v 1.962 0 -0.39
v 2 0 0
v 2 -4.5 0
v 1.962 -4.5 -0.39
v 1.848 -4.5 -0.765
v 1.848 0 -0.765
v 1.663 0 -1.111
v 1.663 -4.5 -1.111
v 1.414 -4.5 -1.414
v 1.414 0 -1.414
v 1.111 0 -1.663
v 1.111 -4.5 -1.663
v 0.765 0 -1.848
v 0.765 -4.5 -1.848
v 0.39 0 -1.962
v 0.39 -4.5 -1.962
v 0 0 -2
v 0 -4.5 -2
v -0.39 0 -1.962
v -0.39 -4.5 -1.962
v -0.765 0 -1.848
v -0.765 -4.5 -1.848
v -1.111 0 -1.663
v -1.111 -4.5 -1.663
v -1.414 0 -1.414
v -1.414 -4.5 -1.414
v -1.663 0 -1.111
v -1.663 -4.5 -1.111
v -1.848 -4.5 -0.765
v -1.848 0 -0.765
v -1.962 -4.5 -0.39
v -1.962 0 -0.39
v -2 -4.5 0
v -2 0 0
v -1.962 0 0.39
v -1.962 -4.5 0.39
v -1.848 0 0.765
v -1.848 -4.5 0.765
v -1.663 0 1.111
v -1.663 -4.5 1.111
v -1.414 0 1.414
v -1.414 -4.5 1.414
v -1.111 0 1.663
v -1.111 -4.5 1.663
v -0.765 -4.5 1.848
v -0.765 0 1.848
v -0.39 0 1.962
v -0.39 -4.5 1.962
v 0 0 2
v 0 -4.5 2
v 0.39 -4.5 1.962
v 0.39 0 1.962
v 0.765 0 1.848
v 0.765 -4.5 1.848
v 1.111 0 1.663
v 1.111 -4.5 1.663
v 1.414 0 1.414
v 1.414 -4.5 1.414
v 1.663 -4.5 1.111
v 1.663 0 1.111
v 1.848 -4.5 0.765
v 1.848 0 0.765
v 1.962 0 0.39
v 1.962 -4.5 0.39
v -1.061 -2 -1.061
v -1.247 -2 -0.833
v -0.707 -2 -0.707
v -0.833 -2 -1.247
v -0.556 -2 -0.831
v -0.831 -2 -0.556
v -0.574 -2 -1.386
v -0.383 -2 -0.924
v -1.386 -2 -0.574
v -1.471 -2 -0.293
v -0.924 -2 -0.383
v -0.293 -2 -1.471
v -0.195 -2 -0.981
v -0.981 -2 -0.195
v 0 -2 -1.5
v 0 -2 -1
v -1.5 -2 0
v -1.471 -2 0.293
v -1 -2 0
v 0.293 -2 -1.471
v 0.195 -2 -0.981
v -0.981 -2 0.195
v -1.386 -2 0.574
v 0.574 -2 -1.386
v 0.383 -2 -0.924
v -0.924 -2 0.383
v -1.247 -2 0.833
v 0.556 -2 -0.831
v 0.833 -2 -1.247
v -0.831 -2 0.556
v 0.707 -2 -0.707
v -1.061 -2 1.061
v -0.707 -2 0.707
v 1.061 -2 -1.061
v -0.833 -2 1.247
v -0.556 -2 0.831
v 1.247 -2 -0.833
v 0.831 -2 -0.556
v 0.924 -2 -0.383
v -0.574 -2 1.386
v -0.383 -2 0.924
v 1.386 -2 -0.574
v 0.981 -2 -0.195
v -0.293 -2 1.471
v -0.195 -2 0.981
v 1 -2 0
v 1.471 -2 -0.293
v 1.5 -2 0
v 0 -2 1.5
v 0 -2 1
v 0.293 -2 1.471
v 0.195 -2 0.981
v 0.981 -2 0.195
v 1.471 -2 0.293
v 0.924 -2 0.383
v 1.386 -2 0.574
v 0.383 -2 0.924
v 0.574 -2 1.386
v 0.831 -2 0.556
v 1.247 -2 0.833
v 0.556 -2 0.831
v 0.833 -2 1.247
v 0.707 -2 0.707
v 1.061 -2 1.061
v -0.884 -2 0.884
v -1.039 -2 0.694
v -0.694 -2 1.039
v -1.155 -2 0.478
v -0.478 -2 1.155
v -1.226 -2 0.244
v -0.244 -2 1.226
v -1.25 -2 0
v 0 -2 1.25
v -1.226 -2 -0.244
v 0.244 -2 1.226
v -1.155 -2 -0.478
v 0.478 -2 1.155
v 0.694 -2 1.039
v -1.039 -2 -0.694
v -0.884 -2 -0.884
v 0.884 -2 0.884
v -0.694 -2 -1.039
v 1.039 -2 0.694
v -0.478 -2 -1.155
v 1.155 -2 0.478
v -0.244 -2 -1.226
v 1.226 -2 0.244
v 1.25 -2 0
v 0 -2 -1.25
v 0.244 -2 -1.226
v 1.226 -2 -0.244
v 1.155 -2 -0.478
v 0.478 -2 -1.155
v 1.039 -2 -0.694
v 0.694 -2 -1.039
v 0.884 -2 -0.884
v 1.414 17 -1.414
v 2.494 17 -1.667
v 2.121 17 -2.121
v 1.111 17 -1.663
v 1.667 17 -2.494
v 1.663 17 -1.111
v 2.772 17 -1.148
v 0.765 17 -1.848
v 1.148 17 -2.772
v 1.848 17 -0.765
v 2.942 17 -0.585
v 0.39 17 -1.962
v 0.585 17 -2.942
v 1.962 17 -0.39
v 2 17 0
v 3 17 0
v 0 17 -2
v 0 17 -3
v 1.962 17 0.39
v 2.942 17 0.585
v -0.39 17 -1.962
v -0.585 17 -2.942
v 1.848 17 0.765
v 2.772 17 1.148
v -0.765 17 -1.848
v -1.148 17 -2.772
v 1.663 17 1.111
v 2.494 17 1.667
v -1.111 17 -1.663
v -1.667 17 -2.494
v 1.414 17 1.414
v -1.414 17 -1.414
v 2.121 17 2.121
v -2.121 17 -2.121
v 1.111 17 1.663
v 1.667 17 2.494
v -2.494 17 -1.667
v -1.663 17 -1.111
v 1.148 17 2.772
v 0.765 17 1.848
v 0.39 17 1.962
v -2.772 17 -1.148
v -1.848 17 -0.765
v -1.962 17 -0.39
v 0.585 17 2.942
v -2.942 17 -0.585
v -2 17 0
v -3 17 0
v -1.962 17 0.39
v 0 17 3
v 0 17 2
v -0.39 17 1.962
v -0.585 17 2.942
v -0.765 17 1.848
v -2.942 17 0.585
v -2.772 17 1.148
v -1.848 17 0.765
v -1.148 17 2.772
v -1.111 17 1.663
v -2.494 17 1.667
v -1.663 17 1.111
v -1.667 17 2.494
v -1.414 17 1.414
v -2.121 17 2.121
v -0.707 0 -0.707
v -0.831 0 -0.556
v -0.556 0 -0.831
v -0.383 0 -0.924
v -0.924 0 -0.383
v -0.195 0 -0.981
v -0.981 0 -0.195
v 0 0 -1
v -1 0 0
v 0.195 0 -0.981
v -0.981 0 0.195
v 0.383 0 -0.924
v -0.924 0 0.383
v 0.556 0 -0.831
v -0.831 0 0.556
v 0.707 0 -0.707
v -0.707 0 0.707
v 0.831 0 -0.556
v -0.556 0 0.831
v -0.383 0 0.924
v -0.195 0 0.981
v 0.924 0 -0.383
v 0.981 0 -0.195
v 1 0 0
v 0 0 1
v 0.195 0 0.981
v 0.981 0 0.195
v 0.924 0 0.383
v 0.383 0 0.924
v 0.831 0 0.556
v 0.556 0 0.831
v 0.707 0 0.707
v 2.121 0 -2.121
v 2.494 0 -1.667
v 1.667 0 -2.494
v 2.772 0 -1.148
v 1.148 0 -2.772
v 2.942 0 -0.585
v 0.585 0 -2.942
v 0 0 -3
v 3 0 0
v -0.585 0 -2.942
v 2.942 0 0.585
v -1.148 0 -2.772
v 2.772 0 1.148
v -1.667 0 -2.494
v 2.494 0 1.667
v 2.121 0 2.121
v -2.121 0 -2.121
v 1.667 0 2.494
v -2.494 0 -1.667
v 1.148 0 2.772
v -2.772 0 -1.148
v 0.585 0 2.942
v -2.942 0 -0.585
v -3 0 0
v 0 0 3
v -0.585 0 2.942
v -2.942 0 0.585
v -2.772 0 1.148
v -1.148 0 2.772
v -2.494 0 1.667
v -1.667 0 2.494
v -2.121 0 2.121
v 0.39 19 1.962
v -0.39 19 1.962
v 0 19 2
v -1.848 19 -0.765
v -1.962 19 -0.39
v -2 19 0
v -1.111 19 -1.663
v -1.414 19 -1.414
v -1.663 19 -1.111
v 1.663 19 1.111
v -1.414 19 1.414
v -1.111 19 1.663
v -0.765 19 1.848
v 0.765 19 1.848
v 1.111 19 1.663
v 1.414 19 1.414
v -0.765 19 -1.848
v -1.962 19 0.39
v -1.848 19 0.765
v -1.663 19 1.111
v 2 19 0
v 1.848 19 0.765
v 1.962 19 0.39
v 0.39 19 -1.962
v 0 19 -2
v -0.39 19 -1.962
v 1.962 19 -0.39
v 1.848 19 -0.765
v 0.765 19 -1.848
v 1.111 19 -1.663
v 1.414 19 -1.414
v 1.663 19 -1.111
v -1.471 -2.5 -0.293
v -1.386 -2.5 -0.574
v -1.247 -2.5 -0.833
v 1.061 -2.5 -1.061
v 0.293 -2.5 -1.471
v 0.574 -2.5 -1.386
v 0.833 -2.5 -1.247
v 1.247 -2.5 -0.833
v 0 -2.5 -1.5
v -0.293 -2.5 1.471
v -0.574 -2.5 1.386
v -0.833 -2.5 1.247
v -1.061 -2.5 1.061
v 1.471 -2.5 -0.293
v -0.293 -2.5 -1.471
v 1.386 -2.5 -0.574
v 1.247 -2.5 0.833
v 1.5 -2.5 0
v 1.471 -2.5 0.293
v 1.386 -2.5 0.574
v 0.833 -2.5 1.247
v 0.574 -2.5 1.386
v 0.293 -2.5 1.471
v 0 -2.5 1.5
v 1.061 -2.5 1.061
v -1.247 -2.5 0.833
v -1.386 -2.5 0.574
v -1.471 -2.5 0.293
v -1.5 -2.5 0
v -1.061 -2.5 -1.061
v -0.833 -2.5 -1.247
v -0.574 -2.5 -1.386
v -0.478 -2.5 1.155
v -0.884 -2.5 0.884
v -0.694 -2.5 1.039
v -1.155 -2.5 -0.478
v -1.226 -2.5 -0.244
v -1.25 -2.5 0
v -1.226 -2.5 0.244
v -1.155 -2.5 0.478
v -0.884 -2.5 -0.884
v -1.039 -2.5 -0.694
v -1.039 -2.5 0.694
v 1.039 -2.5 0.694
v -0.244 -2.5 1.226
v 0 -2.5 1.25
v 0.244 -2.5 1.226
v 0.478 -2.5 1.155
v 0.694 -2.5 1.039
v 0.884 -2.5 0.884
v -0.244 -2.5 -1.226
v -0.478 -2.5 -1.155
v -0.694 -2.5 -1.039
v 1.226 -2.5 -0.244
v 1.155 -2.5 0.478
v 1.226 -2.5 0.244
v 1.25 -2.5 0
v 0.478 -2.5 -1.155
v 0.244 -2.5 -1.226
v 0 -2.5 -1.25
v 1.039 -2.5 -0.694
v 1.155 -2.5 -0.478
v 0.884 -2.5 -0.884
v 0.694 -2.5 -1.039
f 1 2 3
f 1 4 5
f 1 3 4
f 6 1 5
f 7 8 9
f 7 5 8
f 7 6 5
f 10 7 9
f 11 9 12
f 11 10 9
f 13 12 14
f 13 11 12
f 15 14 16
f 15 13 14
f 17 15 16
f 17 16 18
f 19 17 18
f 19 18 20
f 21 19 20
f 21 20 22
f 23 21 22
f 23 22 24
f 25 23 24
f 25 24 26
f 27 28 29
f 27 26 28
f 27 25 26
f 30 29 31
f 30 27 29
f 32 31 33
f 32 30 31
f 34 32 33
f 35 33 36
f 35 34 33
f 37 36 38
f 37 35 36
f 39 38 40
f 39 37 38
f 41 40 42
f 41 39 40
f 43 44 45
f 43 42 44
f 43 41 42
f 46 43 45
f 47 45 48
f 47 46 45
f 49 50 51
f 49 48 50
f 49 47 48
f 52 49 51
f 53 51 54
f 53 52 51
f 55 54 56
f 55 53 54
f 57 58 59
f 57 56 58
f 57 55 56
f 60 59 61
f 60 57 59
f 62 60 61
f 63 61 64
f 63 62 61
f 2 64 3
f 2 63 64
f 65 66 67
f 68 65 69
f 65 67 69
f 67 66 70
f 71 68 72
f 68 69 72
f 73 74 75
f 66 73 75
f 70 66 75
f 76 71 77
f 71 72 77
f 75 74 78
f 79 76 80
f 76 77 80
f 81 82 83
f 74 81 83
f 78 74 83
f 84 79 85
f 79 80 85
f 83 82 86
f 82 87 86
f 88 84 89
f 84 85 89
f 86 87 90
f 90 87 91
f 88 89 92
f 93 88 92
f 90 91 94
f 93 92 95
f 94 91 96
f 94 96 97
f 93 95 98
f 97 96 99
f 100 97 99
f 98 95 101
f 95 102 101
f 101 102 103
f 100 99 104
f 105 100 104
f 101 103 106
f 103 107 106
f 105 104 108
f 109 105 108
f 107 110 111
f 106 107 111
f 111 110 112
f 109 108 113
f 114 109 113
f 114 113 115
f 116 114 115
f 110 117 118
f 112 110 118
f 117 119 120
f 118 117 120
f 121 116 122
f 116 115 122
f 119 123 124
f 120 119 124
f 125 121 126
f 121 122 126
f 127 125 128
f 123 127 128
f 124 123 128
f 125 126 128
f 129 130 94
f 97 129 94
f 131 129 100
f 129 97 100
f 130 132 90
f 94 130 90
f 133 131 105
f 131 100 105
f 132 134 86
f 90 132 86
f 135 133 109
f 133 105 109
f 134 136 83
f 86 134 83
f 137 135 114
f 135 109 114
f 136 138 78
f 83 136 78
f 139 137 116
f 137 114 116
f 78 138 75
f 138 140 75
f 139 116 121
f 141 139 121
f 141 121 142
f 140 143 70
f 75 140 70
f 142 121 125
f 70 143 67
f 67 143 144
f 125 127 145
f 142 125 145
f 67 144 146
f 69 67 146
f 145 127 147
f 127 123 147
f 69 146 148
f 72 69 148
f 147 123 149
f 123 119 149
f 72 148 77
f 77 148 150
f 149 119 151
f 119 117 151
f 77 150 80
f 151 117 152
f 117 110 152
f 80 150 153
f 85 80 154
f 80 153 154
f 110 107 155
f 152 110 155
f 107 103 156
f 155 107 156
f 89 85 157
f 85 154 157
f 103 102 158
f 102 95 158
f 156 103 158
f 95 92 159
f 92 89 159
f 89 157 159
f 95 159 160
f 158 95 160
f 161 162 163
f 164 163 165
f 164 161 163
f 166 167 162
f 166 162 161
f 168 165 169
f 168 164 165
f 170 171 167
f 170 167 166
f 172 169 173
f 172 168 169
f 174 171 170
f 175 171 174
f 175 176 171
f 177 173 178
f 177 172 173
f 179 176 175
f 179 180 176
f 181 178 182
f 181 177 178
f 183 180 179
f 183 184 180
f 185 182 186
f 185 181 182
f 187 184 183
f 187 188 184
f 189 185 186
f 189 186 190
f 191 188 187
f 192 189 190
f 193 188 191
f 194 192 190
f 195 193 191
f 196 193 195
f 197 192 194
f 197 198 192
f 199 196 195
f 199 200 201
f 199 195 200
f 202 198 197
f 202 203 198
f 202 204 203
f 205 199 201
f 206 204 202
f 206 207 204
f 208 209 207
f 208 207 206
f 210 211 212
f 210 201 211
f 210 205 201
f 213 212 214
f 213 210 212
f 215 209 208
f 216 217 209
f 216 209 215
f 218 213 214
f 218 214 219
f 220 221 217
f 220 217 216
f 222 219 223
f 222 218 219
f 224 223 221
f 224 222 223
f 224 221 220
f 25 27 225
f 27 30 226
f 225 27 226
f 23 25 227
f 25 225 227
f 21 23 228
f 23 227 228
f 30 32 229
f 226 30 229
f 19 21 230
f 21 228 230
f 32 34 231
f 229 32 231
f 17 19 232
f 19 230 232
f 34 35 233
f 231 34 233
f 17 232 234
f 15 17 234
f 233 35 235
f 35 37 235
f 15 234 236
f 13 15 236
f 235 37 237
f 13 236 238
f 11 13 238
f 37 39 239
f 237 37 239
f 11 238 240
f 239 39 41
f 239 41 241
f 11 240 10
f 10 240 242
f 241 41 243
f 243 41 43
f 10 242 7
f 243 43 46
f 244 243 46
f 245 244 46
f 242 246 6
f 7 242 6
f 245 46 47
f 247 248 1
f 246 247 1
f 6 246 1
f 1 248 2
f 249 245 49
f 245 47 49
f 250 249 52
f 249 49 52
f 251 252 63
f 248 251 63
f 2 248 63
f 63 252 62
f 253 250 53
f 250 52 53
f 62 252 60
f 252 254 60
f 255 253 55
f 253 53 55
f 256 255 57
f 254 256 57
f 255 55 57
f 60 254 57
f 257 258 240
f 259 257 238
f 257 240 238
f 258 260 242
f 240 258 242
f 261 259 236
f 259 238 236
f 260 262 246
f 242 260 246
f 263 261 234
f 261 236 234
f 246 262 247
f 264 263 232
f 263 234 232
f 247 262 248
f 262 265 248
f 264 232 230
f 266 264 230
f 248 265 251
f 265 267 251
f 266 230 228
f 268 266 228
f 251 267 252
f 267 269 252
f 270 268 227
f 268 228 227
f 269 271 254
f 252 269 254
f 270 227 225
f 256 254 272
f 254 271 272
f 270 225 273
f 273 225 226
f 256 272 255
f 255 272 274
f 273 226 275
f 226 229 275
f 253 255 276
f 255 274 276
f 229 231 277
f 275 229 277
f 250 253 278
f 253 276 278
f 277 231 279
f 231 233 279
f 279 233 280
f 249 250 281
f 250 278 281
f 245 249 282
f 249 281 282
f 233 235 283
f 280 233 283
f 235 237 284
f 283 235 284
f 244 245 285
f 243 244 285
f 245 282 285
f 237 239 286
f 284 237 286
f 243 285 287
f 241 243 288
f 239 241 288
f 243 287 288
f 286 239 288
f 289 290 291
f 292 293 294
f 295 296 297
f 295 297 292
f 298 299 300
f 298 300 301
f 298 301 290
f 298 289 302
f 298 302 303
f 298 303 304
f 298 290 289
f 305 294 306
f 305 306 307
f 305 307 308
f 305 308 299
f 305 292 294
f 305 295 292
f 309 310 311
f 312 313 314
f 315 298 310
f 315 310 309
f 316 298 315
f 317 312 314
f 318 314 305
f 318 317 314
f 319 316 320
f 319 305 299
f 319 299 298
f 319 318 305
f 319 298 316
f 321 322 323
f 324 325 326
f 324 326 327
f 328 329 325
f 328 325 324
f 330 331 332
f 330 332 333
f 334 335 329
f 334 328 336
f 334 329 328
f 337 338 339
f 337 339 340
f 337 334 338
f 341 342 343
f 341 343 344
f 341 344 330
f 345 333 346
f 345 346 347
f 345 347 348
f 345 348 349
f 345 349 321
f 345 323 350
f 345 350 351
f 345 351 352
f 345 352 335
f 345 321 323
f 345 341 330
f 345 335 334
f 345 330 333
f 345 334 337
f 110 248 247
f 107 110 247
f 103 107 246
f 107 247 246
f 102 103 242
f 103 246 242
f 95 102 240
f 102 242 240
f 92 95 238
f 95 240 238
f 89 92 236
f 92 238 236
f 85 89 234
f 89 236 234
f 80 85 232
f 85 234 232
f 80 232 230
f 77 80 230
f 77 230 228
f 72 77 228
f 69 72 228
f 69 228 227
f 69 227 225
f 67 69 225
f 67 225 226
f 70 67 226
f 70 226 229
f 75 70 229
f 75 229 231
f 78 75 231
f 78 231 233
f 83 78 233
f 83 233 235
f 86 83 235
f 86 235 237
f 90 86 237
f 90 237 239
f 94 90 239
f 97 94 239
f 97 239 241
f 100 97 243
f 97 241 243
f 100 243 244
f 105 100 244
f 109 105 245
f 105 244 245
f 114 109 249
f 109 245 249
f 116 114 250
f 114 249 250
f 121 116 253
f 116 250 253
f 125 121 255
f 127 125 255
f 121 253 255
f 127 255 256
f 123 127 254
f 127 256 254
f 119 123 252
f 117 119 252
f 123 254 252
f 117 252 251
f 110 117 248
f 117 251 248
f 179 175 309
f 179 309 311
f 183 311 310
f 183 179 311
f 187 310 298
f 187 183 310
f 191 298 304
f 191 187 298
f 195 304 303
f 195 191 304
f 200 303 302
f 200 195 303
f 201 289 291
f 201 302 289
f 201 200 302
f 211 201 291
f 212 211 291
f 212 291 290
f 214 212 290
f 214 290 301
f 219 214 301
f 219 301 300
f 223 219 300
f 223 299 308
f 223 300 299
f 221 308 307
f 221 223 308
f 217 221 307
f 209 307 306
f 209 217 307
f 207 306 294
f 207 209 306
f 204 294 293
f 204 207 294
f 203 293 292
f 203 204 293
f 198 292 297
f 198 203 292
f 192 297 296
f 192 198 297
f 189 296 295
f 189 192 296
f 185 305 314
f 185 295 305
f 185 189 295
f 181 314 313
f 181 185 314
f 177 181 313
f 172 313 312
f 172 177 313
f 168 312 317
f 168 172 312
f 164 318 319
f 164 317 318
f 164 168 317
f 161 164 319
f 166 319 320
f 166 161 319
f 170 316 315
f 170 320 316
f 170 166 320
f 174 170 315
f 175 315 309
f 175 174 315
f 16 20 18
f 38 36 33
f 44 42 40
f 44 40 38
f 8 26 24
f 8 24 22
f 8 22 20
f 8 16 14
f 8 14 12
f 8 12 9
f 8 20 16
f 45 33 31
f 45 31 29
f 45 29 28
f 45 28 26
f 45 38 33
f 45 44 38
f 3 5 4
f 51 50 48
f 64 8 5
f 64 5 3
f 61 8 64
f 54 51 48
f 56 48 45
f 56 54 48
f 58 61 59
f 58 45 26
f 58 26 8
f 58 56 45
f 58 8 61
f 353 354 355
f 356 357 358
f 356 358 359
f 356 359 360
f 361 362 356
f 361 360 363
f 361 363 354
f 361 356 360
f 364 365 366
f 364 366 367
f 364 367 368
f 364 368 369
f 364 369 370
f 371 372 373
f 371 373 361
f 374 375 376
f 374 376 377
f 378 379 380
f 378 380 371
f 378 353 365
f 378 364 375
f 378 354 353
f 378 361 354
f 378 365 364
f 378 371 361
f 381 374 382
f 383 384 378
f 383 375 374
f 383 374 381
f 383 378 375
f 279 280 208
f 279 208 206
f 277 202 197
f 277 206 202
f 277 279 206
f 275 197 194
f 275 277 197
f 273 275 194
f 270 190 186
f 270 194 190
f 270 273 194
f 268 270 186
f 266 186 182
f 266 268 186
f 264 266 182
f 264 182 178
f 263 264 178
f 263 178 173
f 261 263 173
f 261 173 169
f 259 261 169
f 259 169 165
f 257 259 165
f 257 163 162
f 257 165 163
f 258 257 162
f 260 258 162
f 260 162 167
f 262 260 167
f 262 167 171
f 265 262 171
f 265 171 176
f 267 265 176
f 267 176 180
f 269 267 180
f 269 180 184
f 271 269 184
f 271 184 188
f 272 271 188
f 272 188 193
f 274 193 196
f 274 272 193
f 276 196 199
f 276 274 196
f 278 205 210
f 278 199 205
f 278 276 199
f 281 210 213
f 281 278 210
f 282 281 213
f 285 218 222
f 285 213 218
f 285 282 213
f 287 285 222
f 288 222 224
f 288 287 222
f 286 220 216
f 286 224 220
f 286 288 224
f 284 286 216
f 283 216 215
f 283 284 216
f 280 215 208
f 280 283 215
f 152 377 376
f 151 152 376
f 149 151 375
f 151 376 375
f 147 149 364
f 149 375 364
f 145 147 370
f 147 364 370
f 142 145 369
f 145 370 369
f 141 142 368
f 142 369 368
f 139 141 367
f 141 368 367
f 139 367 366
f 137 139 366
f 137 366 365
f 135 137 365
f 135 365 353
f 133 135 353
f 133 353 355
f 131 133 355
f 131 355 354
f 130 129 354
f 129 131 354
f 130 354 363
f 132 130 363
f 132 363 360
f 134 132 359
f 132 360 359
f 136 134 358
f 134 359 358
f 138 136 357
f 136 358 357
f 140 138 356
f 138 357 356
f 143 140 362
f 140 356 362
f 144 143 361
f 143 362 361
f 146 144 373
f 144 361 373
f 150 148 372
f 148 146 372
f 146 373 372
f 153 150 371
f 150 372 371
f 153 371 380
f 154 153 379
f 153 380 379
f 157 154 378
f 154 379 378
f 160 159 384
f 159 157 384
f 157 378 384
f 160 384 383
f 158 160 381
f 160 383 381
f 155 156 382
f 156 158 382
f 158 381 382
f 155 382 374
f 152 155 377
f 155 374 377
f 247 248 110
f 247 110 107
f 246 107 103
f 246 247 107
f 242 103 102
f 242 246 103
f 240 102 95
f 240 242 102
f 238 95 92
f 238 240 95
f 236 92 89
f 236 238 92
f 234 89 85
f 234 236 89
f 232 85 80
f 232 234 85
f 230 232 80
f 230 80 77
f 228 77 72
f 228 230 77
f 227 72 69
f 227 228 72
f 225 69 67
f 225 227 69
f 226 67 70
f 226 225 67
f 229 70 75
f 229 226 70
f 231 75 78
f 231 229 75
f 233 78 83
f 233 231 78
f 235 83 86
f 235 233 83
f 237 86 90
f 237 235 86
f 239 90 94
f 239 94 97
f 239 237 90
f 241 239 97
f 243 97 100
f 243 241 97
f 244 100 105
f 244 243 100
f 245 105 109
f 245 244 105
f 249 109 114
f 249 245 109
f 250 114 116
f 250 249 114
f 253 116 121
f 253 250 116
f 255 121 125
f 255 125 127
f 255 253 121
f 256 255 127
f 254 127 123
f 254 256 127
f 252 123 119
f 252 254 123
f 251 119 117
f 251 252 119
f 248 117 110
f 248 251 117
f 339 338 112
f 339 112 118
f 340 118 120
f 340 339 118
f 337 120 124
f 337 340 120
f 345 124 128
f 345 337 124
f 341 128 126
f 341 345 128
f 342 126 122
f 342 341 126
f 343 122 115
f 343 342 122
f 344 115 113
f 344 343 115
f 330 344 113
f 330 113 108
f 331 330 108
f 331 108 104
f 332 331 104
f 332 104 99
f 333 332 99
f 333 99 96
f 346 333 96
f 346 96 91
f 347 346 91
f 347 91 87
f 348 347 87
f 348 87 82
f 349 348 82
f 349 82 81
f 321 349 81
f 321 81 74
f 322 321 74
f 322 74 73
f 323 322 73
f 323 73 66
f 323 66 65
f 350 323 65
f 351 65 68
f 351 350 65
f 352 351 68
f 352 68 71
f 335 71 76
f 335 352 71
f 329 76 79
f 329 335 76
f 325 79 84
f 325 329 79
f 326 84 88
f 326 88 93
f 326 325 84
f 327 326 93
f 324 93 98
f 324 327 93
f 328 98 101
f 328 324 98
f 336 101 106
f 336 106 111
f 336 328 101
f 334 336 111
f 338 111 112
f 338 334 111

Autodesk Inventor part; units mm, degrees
ref_plane "YZ Plane" through (0, 0, 0) normal (1, 0, 0) x (0, 1, 0)
ref_plane "XZ Plane" through (0, 0, 0) normal (0, 1, 0) x (-1, 0, 0)
ref_plane "XY Plane" through (0, 0, 0) normal (0, 0, 1) x (1, 0, 0)
sketch "Sketch1" plane through (0, 0, 0) normal (0, 1, 0) x (-1, 0, 0)
  circle A0 centre (0, 0) radius 3
  dimension "d0" = 6
extrude "Extrusion1" add sketch "Sketch1" along normal blind 17
sketch "Sketch2" plane through (0, 17, 0) normal (0, 1, 0) x (1, 0, 0)
  circle A0 centre (0, 0) radius 2
  dimension "d3" = 4
extrude "Extrusion2" add sketch "Sketch2" along normal blind 2
sketch "Sketch3" plane through (0, 0, 0) normal (0, -1, 0) x (1, 0, 0)
  circle A0 centre (0, 0) radius 2
  dimension "d6" = 4
extrude "Extrusion3" add sketch "Sketch3" along normal blind 4.5 separate body
sketch "Sketch4" plane through (0, 0, 0) normal (0, -1, 0) x (1, 0, 0)
  circle A0 centre (0, 0) radius 1
  dimension "d9" = 2
extrude "Extrusion4" add sketch "Sketch4" along normal blind 2.5 bodies 1
sketch "Sketch5" plane through (0, -2.5, 0) normal (0, -1, 0) x (1, 0, 0)
  circle A0 centre (0, 0) radius 1.5
  dimension "d12" = 3
extrude "Extrusion5" add sketch "Sketch5" against normal blind 0.5 bodies 1
sketch "Sketch6" plane through (0, 0, 0) normal (0, 1, 0) x (1, 0, 0)
  circle A0 centre (0, 0) radius 2 projected
  circle A1 centre (0, 0) radius 1
  dimension "d15" = 2
extrude "Extrusion6" cut sketch "Sketch6" against normal blind 2.5 contours A1 bodies 2
sketch "Sketch7" plane through (0, -2.5, 0) normal (0, 1, 0) x (1, 0, 0)
  circle A0 centre (0, 0) radius 1.25
  dimension "d18" = 2.5
extrude "Extrusion7" cut sketch "Sketch7" along normal blind 0.5 bodies 2
properties part number "Plunger"
